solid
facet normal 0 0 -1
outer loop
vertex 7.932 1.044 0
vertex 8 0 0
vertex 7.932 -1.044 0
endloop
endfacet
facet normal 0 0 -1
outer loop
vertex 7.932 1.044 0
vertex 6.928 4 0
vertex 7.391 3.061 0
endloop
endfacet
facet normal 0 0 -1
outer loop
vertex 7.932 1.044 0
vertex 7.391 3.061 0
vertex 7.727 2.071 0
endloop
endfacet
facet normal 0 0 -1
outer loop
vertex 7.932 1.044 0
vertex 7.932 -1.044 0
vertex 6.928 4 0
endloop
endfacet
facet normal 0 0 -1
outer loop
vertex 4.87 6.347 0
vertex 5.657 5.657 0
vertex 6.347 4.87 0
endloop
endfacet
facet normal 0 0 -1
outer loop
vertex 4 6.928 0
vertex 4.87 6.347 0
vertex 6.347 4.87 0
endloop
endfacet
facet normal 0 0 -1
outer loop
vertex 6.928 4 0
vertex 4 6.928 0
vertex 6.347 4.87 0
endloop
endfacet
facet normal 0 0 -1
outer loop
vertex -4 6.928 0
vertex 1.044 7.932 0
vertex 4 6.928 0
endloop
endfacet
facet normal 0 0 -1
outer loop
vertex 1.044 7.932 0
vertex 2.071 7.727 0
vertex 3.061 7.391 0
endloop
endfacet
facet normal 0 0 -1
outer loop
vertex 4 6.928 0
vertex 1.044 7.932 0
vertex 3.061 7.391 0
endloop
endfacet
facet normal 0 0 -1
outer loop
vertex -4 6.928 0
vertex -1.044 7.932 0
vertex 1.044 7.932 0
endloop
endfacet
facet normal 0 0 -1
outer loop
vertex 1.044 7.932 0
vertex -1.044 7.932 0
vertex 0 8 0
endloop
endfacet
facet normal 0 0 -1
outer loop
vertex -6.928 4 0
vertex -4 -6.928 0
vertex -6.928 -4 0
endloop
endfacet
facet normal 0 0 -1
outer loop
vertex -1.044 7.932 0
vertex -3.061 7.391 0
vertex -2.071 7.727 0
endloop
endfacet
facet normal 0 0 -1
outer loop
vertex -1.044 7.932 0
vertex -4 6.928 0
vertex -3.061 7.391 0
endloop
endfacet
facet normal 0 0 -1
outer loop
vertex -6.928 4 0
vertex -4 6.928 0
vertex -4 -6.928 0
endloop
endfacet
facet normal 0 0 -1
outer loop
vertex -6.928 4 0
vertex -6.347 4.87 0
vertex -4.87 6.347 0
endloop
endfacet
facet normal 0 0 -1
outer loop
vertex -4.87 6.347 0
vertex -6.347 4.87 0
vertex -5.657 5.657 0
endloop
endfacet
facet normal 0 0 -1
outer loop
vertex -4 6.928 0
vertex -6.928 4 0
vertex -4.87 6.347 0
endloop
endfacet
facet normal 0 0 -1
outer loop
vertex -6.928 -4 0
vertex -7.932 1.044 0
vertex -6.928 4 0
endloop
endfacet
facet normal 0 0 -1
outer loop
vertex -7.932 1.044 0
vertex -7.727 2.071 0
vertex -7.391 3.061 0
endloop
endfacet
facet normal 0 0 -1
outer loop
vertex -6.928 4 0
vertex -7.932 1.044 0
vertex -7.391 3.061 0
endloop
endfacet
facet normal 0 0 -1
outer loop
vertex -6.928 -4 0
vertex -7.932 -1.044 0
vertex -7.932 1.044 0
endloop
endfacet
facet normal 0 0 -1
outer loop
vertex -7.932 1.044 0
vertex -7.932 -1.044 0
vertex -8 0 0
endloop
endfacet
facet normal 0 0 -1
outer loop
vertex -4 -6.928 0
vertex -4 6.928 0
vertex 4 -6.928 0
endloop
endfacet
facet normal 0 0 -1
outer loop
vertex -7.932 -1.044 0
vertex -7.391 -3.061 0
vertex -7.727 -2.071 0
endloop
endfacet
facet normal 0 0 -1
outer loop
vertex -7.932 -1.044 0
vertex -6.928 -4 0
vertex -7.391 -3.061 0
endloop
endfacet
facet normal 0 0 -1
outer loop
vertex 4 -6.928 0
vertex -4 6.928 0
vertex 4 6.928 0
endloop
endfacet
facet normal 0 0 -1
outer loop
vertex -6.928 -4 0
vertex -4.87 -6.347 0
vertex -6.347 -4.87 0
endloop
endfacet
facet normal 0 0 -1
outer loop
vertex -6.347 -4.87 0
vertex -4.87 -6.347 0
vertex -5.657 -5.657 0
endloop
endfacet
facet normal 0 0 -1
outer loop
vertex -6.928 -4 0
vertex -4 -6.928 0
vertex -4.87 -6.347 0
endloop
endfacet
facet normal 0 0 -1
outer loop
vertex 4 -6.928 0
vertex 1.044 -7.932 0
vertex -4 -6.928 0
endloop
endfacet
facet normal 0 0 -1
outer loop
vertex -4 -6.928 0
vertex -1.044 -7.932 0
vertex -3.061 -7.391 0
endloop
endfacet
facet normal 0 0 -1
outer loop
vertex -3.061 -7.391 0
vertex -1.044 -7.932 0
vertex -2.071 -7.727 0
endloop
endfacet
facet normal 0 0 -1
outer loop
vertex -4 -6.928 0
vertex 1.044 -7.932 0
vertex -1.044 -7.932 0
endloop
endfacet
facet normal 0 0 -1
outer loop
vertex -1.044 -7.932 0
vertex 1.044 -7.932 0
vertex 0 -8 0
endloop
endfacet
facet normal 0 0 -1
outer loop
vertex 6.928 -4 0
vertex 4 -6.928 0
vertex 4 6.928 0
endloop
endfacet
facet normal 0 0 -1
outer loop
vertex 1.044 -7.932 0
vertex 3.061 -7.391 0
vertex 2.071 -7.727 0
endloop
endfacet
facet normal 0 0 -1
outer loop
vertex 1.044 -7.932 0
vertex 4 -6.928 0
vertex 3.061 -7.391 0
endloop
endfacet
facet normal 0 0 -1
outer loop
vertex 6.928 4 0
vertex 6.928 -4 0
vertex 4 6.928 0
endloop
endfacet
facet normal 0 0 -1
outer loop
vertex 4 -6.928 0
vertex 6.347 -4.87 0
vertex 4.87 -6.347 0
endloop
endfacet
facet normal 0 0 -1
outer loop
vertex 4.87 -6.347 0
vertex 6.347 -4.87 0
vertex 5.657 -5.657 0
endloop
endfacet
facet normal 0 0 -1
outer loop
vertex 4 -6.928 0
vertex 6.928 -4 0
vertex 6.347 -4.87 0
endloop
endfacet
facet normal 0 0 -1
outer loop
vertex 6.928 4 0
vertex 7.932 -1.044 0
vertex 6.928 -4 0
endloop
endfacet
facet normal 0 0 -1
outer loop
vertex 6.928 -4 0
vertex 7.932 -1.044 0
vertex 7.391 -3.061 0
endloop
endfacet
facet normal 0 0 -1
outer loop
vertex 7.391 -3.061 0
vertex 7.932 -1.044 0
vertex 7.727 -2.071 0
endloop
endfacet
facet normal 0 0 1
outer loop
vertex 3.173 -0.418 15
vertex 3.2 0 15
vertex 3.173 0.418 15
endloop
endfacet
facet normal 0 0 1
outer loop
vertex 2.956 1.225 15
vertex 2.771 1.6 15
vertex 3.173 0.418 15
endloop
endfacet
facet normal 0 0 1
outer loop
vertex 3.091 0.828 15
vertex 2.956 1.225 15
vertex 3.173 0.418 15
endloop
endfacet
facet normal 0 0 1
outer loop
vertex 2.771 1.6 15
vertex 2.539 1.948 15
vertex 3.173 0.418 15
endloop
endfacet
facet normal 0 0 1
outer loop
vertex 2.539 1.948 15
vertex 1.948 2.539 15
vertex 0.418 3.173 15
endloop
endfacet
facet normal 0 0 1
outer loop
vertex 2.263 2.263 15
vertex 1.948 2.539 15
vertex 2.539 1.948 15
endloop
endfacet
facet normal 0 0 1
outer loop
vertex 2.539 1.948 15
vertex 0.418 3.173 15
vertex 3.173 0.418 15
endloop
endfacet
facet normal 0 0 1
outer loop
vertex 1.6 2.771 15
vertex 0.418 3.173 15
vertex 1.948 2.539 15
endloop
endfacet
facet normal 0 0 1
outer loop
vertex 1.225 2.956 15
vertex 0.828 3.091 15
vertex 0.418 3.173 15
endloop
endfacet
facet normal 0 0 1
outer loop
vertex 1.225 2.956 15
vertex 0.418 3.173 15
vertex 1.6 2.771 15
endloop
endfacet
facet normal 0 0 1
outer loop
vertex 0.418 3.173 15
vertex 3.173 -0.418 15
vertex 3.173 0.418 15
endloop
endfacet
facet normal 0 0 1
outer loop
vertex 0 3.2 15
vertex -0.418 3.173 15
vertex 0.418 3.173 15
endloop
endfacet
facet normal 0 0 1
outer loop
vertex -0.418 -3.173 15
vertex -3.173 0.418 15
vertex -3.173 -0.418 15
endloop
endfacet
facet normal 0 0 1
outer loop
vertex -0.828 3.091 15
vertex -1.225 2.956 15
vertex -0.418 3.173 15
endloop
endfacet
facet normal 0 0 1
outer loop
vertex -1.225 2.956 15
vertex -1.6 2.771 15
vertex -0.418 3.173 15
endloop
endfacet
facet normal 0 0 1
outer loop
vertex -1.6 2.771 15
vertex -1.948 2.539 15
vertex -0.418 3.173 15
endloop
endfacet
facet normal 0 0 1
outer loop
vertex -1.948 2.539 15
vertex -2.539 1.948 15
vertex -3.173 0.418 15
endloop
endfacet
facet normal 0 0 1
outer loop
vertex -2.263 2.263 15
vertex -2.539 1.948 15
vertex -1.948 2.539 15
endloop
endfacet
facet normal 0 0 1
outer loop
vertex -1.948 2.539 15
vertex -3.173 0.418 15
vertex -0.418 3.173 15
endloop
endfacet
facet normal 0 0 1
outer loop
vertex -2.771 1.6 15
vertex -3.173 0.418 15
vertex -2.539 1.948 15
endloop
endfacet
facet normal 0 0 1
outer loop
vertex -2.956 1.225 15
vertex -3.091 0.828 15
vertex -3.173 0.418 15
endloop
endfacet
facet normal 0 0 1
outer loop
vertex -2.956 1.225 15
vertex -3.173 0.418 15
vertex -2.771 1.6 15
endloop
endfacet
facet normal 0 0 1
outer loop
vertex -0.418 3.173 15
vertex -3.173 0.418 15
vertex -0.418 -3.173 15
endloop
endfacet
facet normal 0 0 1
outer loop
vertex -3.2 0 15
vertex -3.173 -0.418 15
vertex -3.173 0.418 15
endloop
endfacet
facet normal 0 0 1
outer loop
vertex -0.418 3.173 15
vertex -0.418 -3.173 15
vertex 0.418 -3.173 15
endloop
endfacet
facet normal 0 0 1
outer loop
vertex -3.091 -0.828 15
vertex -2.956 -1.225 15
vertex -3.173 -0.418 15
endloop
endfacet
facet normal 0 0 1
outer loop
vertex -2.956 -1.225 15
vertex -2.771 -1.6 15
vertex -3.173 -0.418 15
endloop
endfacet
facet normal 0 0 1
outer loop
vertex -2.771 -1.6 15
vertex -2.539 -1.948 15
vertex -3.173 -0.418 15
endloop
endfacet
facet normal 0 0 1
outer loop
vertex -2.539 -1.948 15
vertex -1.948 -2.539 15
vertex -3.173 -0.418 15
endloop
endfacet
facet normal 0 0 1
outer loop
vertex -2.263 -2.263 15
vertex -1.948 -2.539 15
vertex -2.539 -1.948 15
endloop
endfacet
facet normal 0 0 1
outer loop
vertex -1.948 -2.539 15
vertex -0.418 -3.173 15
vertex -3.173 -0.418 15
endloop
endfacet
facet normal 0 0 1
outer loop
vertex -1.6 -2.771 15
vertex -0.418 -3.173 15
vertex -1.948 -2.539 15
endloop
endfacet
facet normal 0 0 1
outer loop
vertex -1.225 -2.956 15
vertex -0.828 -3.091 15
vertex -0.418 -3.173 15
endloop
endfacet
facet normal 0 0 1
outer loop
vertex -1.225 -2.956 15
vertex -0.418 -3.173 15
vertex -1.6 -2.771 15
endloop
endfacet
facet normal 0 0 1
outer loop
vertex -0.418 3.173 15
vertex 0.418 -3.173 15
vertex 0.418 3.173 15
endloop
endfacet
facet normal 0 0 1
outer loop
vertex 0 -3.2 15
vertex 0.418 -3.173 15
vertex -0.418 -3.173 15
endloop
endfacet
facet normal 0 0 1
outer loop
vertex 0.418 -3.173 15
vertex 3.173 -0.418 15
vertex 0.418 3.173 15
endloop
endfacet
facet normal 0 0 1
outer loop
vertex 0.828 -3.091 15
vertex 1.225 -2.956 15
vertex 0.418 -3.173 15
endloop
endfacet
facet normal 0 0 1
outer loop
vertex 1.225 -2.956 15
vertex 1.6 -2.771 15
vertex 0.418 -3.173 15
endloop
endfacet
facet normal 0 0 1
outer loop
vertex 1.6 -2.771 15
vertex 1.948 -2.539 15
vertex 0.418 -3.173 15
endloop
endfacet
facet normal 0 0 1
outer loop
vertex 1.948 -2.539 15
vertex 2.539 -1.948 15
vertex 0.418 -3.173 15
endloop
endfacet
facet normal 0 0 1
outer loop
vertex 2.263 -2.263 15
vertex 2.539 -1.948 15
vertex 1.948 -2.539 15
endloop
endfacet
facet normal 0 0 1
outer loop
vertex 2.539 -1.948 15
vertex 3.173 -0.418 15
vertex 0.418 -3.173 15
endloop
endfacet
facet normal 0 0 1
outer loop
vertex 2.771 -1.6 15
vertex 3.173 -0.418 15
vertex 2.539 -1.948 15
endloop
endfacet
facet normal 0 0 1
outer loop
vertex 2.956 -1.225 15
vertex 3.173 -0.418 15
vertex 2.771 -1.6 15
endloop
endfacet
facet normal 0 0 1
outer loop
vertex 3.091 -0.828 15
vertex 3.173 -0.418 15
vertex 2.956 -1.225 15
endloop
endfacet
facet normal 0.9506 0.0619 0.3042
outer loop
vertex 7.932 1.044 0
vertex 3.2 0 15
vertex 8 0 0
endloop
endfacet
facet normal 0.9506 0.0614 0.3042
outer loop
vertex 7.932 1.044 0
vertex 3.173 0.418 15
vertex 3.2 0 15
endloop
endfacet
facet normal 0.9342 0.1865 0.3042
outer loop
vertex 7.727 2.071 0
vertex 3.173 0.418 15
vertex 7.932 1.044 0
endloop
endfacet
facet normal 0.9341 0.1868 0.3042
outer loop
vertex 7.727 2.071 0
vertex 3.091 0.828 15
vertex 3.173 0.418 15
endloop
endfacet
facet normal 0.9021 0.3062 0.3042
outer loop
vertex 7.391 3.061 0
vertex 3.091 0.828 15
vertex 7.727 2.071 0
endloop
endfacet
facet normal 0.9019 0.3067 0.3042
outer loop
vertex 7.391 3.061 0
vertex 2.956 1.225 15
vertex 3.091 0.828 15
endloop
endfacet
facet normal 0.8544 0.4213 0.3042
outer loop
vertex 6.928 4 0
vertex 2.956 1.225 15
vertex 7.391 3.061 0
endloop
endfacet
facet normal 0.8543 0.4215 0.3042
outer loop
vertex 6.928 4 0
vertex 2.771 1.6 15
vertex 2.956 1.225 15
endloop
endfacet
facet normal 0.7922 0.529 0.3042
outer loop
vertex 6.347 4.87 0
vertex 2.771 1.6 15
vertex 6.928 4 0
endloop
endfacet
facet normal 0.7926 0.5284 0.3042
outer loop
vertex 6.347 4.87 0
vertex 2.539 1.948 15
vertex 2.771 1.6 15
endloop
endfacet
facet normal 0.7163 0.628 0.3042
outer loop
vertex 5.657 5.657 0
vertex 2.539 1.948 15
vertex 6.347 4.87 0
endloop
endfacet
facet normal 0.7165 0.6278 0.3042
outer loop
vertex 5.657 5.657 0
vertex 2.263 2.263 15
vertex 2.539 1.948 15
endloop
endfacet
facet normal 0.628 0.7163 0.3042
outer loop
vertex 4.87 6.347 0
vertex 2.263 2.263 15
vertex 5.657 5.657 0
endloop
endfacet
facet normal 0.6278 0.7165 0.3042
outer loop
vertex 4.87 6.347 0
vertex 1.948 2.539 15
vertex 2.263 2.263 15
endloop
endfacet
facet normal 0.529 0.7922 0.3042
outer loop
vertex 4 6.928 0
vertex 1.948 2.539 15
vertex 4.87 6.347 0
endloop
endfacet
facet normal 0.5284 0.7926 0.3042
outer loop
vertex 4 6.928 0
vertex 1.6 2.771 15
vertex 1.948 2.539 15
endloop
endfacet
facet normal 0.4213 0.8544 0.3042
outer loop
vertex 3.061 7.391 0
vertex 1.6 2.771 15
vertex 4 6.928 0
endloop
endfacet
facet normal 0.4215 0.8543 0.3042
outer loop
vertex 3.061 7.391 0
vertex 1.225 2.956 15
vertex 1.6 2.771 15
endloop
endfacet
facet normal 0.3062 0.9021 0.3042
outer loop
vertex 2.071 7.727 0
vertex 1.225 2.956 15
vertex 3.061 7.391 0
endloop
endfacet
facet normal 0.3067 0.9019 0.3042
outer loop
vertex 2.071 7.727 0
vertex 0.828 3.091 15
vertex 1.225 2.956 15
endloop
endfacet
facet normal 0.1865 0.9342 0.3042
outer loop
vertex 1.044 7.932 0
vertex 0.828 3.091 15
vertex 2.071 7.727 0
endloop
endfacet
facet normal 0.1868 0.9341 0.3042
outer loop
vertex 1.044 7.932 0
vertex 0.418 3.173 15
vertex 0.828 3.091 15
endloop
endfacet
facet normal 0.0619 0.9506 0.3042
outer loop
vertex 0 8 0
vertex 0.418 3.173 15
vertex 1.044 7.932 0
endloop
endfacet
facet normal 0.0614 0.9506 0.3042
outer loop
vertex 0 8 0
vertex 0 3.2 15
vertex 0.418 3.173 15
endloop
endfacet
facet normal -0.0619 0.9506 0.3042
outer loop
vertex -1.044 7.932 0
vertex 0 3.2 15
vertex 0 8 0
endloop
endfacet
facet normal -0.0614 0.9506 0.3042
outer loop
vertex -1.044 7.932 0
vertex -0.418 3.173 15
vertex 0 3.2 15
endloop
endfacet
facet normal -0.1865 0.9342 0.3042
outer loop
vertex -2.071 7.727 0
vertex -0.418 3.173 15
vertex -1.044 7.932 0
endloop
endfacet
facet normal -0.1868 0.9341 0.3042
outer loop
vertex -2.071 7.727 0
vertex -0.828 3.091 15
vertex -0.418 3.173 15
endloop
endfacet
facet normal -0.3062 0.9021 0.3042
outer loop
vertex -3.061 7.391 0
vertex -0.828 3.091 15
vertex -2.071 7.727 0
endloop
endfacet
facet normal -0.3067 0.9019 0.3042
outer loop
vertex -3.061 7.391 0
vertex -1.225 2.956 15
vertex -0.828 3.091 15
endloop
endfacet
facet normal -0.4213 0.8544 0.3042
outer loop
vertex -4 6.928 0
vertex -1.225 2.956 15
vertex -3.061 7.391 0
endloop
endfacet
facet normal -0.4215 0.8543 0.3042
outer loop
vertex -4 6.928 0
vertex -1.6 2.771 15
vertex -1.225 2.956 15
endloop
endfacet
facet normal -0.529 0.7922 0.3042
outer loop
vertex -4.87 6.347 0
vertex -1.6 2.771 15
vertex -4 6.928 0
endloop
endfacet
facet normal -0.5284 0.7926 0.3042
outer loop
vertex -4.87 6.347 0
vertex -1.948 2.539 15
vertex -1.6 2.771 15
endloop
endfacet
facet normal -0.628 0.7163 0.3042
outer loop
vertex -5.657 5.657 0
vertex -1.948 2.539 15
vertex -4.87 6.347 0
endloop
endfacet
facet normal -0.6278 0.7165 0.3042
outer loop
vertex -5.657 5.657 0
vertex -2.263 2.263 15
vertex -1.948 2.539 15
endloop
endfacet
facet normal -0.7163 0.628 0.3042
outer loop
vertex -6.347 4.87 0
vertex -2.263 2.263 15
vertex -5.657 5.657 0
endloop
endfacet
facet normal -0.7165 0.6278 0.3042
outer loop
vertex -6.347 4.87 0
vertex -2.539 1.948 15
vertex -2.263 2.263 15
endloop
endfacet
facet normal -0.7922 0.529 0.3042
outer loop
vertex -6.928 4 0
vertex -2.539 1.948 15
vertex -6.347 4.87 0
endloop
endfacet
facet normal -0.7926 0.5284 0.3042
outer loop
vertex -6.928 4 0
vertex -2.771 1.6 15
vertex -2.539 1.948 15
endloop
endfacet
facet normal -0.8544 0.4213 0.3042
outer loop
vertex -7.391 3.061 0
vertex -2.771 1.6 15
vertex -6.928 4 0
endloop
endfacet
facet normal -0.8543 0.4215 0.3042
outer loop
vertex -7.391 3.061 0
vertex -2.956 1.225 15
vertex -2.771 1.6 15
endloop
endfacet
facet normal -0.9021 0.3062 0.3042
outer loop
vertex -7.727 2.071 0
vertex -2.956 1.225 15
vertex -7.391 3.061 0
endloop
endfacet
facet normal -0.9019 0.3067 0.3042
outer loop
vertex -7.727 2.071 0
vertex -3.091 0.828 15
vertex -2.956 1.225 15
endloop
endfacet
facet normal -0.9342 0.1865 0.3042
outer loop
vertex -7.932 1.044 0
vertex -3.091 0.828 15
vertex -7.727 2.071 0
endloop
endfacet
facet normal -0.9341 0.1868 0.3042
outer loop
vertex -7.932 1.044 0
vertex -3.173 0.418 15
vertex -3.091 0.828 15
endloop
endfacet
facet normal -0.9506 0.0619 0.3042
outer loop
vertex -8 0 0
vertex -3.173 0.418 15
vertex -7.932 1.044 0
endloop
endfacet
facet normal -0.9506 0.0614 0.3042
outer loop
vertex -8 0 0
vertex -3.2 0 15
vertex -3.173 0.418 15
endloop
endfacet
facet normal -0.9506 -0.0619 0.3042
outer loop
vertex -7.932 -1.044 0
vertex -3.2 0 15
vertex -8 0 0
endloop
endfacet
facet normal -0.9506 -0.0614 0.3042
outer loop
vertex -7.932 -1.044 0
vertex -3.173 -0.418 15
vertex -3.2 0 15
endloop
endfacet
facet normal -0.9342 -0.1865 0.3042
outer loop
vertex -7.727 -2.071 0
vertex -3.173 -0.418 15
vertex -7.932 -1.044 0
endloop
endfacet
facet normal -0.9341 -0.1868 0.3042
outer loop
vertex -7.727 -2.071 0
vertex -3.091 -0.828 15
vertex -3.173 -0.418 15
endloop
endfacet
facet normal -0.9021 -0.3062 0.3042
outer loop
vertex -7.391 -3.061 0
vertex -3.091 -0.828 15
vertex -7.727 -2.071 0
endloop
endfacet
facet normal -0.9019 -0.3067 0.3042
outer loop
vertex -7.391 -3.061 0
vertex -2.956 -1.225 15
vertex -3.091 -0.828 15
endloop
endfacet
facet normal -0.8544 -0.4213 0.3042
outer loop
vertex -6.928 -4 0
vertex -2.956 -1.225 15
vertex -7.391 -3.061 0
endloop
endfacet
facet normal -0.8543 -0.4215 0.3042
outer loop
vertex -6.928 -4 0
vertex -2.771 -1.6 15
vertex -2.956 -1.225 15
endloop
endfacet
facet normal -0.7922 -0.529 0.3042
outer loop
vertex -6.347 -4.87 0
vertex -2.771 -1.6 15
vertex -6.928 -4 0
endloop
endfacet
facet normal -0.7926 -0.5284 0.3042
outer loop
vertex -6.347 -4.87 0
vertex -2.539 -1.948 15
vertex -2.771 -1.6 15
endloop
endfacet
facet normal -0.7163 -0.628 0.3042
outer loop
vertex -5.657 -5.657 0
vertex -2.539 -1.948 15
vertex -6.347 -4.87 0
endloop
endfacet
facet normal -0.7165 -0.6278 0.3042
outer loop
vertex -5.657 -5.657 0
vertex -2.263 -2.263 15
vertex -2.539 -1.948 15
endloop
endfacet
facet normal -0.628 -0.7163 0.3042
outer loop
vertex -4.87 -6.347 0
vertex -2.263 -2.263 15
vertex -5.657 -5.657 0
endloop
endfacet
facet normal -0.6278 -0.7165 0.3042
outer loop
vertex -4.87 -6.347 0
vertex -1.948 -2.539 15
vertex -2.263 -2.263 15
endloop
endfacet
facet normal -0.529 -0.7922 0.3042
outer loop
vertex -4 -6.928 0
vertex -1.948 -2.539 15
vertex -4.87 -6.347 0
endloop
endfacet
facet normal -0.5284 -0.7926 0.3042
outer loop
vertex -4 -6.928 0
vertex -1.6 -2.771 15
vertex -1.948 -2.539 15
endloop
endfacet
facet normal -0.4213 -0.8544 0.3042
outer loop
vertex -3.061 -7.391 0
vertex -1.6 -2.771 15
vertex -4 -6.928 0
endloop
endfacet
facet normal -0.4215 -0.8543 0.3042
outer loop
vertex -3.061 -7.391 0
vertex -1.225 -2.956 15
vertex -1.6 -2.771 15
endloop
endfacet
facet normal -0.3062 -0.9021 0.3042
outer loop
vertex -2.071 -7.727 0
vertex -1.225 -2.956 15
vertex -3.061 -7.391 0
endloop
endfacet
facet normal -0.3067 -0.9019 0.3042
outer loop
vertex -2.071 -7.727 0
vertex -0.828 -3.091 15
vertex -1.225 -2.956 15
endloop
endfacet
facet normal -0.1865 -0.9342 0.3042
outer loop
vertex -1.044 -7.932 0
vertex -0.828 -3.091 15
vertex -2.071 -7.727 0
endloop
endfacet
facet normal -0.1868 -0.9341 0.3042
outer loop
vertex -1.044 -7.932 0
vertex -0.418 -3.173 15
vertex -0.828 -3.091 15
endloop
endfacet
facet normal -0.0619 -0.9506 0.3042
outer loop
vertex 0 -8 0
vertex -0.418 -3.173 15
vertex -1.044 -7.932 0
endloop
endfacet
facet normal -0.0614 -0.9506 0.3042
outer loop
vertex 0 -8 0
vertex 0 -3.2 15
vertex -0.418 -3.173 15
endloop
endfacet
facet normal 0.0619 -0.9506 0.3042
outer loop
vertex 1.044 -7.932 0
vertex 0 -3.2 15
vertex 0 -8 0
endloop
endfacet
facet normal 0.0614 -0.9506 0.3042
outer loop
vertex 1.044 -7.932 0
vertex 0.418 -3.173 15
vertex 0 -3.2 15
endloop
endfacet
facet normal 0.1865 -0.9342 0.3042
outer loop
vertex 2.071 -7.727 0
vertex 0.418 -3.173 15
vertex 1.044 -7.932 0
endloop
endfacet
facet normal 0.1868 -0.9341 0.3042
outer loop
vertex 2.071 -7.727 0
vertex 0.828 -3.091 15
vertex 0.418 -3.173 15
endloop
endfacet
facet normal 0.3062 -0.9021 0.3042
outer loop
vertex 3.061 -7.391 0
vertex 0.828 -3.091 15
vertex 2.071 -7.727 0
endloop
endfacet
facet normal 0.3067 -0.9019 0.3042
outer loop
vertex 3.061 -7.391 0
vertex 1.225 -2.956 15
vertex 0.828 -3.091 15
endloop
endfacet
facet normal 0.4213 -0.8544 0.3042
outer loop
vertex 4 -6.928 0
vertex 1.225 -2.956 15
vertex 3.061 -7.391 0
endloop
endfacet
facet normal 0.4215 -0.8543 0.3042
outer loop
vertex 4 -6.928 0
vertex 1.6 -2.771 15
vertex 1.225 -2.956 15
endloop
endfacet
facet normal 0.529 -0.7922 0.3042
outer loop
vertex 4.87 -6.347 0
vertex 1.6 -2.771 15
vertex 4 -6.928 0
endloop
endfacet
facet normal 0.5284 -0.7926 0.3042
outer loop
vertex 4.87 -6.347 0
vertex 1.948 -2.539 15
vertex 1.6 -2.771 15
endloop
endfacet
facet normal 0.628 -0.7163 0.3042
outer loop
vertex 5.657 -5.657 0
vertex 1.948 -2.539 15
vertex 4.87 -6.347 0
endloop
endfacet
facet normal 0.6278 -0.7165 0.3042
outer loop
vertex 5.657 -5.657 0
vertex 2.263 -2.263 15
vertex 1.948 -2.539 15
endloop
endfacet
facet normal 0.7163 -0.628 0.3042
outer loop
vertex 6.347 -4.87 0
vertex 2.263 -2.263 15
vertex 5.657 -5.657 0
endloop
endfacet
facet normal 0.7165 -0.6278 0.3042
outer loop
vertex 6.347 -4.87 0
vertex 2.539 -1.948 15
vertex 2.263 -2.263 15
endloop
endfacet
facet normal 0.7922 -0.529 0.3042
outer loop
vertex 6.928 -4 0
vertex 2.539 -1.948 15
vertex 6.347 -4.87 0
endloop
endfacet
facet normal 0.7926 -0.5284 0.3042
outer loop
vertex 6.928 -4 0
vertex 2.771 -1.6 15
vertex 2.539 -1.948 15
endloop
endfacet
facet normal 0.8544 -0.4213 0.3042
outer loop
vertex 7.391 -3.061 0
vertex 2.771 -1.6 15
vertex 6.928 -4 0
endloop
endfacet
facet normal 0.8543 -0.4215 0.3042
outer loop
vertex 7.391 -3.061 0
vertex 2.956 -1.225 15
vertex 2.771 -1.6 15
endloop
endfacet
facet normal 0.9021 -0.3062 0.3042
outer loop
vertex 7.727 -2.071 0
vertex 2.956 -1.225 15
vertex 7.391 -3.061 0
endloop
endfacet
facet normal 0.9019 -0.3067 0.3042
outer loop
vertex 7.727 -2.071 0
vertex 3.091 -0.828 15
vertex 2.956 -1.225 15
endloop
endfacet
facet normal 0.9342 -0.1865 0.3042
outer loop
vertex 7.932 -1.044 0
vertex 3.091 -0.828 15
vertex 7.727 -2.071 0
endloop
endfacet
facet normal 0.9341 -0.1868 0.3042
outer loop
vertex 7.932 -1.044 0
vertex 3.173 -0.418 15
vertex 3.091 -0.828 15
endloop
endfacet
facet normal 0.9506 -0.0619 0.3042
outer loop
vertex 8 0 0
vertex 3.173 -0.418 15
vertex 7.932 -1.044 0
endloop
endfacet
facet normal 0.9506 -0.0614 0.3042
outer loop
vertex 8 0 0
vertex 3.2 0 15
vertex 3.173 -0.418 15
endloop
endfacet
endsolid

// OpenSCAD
// Construct: linear_extrude() with a scale taper.
linear_extrude(height = 15, scale = 0.4, $fn = 48) circle(r = 8);
